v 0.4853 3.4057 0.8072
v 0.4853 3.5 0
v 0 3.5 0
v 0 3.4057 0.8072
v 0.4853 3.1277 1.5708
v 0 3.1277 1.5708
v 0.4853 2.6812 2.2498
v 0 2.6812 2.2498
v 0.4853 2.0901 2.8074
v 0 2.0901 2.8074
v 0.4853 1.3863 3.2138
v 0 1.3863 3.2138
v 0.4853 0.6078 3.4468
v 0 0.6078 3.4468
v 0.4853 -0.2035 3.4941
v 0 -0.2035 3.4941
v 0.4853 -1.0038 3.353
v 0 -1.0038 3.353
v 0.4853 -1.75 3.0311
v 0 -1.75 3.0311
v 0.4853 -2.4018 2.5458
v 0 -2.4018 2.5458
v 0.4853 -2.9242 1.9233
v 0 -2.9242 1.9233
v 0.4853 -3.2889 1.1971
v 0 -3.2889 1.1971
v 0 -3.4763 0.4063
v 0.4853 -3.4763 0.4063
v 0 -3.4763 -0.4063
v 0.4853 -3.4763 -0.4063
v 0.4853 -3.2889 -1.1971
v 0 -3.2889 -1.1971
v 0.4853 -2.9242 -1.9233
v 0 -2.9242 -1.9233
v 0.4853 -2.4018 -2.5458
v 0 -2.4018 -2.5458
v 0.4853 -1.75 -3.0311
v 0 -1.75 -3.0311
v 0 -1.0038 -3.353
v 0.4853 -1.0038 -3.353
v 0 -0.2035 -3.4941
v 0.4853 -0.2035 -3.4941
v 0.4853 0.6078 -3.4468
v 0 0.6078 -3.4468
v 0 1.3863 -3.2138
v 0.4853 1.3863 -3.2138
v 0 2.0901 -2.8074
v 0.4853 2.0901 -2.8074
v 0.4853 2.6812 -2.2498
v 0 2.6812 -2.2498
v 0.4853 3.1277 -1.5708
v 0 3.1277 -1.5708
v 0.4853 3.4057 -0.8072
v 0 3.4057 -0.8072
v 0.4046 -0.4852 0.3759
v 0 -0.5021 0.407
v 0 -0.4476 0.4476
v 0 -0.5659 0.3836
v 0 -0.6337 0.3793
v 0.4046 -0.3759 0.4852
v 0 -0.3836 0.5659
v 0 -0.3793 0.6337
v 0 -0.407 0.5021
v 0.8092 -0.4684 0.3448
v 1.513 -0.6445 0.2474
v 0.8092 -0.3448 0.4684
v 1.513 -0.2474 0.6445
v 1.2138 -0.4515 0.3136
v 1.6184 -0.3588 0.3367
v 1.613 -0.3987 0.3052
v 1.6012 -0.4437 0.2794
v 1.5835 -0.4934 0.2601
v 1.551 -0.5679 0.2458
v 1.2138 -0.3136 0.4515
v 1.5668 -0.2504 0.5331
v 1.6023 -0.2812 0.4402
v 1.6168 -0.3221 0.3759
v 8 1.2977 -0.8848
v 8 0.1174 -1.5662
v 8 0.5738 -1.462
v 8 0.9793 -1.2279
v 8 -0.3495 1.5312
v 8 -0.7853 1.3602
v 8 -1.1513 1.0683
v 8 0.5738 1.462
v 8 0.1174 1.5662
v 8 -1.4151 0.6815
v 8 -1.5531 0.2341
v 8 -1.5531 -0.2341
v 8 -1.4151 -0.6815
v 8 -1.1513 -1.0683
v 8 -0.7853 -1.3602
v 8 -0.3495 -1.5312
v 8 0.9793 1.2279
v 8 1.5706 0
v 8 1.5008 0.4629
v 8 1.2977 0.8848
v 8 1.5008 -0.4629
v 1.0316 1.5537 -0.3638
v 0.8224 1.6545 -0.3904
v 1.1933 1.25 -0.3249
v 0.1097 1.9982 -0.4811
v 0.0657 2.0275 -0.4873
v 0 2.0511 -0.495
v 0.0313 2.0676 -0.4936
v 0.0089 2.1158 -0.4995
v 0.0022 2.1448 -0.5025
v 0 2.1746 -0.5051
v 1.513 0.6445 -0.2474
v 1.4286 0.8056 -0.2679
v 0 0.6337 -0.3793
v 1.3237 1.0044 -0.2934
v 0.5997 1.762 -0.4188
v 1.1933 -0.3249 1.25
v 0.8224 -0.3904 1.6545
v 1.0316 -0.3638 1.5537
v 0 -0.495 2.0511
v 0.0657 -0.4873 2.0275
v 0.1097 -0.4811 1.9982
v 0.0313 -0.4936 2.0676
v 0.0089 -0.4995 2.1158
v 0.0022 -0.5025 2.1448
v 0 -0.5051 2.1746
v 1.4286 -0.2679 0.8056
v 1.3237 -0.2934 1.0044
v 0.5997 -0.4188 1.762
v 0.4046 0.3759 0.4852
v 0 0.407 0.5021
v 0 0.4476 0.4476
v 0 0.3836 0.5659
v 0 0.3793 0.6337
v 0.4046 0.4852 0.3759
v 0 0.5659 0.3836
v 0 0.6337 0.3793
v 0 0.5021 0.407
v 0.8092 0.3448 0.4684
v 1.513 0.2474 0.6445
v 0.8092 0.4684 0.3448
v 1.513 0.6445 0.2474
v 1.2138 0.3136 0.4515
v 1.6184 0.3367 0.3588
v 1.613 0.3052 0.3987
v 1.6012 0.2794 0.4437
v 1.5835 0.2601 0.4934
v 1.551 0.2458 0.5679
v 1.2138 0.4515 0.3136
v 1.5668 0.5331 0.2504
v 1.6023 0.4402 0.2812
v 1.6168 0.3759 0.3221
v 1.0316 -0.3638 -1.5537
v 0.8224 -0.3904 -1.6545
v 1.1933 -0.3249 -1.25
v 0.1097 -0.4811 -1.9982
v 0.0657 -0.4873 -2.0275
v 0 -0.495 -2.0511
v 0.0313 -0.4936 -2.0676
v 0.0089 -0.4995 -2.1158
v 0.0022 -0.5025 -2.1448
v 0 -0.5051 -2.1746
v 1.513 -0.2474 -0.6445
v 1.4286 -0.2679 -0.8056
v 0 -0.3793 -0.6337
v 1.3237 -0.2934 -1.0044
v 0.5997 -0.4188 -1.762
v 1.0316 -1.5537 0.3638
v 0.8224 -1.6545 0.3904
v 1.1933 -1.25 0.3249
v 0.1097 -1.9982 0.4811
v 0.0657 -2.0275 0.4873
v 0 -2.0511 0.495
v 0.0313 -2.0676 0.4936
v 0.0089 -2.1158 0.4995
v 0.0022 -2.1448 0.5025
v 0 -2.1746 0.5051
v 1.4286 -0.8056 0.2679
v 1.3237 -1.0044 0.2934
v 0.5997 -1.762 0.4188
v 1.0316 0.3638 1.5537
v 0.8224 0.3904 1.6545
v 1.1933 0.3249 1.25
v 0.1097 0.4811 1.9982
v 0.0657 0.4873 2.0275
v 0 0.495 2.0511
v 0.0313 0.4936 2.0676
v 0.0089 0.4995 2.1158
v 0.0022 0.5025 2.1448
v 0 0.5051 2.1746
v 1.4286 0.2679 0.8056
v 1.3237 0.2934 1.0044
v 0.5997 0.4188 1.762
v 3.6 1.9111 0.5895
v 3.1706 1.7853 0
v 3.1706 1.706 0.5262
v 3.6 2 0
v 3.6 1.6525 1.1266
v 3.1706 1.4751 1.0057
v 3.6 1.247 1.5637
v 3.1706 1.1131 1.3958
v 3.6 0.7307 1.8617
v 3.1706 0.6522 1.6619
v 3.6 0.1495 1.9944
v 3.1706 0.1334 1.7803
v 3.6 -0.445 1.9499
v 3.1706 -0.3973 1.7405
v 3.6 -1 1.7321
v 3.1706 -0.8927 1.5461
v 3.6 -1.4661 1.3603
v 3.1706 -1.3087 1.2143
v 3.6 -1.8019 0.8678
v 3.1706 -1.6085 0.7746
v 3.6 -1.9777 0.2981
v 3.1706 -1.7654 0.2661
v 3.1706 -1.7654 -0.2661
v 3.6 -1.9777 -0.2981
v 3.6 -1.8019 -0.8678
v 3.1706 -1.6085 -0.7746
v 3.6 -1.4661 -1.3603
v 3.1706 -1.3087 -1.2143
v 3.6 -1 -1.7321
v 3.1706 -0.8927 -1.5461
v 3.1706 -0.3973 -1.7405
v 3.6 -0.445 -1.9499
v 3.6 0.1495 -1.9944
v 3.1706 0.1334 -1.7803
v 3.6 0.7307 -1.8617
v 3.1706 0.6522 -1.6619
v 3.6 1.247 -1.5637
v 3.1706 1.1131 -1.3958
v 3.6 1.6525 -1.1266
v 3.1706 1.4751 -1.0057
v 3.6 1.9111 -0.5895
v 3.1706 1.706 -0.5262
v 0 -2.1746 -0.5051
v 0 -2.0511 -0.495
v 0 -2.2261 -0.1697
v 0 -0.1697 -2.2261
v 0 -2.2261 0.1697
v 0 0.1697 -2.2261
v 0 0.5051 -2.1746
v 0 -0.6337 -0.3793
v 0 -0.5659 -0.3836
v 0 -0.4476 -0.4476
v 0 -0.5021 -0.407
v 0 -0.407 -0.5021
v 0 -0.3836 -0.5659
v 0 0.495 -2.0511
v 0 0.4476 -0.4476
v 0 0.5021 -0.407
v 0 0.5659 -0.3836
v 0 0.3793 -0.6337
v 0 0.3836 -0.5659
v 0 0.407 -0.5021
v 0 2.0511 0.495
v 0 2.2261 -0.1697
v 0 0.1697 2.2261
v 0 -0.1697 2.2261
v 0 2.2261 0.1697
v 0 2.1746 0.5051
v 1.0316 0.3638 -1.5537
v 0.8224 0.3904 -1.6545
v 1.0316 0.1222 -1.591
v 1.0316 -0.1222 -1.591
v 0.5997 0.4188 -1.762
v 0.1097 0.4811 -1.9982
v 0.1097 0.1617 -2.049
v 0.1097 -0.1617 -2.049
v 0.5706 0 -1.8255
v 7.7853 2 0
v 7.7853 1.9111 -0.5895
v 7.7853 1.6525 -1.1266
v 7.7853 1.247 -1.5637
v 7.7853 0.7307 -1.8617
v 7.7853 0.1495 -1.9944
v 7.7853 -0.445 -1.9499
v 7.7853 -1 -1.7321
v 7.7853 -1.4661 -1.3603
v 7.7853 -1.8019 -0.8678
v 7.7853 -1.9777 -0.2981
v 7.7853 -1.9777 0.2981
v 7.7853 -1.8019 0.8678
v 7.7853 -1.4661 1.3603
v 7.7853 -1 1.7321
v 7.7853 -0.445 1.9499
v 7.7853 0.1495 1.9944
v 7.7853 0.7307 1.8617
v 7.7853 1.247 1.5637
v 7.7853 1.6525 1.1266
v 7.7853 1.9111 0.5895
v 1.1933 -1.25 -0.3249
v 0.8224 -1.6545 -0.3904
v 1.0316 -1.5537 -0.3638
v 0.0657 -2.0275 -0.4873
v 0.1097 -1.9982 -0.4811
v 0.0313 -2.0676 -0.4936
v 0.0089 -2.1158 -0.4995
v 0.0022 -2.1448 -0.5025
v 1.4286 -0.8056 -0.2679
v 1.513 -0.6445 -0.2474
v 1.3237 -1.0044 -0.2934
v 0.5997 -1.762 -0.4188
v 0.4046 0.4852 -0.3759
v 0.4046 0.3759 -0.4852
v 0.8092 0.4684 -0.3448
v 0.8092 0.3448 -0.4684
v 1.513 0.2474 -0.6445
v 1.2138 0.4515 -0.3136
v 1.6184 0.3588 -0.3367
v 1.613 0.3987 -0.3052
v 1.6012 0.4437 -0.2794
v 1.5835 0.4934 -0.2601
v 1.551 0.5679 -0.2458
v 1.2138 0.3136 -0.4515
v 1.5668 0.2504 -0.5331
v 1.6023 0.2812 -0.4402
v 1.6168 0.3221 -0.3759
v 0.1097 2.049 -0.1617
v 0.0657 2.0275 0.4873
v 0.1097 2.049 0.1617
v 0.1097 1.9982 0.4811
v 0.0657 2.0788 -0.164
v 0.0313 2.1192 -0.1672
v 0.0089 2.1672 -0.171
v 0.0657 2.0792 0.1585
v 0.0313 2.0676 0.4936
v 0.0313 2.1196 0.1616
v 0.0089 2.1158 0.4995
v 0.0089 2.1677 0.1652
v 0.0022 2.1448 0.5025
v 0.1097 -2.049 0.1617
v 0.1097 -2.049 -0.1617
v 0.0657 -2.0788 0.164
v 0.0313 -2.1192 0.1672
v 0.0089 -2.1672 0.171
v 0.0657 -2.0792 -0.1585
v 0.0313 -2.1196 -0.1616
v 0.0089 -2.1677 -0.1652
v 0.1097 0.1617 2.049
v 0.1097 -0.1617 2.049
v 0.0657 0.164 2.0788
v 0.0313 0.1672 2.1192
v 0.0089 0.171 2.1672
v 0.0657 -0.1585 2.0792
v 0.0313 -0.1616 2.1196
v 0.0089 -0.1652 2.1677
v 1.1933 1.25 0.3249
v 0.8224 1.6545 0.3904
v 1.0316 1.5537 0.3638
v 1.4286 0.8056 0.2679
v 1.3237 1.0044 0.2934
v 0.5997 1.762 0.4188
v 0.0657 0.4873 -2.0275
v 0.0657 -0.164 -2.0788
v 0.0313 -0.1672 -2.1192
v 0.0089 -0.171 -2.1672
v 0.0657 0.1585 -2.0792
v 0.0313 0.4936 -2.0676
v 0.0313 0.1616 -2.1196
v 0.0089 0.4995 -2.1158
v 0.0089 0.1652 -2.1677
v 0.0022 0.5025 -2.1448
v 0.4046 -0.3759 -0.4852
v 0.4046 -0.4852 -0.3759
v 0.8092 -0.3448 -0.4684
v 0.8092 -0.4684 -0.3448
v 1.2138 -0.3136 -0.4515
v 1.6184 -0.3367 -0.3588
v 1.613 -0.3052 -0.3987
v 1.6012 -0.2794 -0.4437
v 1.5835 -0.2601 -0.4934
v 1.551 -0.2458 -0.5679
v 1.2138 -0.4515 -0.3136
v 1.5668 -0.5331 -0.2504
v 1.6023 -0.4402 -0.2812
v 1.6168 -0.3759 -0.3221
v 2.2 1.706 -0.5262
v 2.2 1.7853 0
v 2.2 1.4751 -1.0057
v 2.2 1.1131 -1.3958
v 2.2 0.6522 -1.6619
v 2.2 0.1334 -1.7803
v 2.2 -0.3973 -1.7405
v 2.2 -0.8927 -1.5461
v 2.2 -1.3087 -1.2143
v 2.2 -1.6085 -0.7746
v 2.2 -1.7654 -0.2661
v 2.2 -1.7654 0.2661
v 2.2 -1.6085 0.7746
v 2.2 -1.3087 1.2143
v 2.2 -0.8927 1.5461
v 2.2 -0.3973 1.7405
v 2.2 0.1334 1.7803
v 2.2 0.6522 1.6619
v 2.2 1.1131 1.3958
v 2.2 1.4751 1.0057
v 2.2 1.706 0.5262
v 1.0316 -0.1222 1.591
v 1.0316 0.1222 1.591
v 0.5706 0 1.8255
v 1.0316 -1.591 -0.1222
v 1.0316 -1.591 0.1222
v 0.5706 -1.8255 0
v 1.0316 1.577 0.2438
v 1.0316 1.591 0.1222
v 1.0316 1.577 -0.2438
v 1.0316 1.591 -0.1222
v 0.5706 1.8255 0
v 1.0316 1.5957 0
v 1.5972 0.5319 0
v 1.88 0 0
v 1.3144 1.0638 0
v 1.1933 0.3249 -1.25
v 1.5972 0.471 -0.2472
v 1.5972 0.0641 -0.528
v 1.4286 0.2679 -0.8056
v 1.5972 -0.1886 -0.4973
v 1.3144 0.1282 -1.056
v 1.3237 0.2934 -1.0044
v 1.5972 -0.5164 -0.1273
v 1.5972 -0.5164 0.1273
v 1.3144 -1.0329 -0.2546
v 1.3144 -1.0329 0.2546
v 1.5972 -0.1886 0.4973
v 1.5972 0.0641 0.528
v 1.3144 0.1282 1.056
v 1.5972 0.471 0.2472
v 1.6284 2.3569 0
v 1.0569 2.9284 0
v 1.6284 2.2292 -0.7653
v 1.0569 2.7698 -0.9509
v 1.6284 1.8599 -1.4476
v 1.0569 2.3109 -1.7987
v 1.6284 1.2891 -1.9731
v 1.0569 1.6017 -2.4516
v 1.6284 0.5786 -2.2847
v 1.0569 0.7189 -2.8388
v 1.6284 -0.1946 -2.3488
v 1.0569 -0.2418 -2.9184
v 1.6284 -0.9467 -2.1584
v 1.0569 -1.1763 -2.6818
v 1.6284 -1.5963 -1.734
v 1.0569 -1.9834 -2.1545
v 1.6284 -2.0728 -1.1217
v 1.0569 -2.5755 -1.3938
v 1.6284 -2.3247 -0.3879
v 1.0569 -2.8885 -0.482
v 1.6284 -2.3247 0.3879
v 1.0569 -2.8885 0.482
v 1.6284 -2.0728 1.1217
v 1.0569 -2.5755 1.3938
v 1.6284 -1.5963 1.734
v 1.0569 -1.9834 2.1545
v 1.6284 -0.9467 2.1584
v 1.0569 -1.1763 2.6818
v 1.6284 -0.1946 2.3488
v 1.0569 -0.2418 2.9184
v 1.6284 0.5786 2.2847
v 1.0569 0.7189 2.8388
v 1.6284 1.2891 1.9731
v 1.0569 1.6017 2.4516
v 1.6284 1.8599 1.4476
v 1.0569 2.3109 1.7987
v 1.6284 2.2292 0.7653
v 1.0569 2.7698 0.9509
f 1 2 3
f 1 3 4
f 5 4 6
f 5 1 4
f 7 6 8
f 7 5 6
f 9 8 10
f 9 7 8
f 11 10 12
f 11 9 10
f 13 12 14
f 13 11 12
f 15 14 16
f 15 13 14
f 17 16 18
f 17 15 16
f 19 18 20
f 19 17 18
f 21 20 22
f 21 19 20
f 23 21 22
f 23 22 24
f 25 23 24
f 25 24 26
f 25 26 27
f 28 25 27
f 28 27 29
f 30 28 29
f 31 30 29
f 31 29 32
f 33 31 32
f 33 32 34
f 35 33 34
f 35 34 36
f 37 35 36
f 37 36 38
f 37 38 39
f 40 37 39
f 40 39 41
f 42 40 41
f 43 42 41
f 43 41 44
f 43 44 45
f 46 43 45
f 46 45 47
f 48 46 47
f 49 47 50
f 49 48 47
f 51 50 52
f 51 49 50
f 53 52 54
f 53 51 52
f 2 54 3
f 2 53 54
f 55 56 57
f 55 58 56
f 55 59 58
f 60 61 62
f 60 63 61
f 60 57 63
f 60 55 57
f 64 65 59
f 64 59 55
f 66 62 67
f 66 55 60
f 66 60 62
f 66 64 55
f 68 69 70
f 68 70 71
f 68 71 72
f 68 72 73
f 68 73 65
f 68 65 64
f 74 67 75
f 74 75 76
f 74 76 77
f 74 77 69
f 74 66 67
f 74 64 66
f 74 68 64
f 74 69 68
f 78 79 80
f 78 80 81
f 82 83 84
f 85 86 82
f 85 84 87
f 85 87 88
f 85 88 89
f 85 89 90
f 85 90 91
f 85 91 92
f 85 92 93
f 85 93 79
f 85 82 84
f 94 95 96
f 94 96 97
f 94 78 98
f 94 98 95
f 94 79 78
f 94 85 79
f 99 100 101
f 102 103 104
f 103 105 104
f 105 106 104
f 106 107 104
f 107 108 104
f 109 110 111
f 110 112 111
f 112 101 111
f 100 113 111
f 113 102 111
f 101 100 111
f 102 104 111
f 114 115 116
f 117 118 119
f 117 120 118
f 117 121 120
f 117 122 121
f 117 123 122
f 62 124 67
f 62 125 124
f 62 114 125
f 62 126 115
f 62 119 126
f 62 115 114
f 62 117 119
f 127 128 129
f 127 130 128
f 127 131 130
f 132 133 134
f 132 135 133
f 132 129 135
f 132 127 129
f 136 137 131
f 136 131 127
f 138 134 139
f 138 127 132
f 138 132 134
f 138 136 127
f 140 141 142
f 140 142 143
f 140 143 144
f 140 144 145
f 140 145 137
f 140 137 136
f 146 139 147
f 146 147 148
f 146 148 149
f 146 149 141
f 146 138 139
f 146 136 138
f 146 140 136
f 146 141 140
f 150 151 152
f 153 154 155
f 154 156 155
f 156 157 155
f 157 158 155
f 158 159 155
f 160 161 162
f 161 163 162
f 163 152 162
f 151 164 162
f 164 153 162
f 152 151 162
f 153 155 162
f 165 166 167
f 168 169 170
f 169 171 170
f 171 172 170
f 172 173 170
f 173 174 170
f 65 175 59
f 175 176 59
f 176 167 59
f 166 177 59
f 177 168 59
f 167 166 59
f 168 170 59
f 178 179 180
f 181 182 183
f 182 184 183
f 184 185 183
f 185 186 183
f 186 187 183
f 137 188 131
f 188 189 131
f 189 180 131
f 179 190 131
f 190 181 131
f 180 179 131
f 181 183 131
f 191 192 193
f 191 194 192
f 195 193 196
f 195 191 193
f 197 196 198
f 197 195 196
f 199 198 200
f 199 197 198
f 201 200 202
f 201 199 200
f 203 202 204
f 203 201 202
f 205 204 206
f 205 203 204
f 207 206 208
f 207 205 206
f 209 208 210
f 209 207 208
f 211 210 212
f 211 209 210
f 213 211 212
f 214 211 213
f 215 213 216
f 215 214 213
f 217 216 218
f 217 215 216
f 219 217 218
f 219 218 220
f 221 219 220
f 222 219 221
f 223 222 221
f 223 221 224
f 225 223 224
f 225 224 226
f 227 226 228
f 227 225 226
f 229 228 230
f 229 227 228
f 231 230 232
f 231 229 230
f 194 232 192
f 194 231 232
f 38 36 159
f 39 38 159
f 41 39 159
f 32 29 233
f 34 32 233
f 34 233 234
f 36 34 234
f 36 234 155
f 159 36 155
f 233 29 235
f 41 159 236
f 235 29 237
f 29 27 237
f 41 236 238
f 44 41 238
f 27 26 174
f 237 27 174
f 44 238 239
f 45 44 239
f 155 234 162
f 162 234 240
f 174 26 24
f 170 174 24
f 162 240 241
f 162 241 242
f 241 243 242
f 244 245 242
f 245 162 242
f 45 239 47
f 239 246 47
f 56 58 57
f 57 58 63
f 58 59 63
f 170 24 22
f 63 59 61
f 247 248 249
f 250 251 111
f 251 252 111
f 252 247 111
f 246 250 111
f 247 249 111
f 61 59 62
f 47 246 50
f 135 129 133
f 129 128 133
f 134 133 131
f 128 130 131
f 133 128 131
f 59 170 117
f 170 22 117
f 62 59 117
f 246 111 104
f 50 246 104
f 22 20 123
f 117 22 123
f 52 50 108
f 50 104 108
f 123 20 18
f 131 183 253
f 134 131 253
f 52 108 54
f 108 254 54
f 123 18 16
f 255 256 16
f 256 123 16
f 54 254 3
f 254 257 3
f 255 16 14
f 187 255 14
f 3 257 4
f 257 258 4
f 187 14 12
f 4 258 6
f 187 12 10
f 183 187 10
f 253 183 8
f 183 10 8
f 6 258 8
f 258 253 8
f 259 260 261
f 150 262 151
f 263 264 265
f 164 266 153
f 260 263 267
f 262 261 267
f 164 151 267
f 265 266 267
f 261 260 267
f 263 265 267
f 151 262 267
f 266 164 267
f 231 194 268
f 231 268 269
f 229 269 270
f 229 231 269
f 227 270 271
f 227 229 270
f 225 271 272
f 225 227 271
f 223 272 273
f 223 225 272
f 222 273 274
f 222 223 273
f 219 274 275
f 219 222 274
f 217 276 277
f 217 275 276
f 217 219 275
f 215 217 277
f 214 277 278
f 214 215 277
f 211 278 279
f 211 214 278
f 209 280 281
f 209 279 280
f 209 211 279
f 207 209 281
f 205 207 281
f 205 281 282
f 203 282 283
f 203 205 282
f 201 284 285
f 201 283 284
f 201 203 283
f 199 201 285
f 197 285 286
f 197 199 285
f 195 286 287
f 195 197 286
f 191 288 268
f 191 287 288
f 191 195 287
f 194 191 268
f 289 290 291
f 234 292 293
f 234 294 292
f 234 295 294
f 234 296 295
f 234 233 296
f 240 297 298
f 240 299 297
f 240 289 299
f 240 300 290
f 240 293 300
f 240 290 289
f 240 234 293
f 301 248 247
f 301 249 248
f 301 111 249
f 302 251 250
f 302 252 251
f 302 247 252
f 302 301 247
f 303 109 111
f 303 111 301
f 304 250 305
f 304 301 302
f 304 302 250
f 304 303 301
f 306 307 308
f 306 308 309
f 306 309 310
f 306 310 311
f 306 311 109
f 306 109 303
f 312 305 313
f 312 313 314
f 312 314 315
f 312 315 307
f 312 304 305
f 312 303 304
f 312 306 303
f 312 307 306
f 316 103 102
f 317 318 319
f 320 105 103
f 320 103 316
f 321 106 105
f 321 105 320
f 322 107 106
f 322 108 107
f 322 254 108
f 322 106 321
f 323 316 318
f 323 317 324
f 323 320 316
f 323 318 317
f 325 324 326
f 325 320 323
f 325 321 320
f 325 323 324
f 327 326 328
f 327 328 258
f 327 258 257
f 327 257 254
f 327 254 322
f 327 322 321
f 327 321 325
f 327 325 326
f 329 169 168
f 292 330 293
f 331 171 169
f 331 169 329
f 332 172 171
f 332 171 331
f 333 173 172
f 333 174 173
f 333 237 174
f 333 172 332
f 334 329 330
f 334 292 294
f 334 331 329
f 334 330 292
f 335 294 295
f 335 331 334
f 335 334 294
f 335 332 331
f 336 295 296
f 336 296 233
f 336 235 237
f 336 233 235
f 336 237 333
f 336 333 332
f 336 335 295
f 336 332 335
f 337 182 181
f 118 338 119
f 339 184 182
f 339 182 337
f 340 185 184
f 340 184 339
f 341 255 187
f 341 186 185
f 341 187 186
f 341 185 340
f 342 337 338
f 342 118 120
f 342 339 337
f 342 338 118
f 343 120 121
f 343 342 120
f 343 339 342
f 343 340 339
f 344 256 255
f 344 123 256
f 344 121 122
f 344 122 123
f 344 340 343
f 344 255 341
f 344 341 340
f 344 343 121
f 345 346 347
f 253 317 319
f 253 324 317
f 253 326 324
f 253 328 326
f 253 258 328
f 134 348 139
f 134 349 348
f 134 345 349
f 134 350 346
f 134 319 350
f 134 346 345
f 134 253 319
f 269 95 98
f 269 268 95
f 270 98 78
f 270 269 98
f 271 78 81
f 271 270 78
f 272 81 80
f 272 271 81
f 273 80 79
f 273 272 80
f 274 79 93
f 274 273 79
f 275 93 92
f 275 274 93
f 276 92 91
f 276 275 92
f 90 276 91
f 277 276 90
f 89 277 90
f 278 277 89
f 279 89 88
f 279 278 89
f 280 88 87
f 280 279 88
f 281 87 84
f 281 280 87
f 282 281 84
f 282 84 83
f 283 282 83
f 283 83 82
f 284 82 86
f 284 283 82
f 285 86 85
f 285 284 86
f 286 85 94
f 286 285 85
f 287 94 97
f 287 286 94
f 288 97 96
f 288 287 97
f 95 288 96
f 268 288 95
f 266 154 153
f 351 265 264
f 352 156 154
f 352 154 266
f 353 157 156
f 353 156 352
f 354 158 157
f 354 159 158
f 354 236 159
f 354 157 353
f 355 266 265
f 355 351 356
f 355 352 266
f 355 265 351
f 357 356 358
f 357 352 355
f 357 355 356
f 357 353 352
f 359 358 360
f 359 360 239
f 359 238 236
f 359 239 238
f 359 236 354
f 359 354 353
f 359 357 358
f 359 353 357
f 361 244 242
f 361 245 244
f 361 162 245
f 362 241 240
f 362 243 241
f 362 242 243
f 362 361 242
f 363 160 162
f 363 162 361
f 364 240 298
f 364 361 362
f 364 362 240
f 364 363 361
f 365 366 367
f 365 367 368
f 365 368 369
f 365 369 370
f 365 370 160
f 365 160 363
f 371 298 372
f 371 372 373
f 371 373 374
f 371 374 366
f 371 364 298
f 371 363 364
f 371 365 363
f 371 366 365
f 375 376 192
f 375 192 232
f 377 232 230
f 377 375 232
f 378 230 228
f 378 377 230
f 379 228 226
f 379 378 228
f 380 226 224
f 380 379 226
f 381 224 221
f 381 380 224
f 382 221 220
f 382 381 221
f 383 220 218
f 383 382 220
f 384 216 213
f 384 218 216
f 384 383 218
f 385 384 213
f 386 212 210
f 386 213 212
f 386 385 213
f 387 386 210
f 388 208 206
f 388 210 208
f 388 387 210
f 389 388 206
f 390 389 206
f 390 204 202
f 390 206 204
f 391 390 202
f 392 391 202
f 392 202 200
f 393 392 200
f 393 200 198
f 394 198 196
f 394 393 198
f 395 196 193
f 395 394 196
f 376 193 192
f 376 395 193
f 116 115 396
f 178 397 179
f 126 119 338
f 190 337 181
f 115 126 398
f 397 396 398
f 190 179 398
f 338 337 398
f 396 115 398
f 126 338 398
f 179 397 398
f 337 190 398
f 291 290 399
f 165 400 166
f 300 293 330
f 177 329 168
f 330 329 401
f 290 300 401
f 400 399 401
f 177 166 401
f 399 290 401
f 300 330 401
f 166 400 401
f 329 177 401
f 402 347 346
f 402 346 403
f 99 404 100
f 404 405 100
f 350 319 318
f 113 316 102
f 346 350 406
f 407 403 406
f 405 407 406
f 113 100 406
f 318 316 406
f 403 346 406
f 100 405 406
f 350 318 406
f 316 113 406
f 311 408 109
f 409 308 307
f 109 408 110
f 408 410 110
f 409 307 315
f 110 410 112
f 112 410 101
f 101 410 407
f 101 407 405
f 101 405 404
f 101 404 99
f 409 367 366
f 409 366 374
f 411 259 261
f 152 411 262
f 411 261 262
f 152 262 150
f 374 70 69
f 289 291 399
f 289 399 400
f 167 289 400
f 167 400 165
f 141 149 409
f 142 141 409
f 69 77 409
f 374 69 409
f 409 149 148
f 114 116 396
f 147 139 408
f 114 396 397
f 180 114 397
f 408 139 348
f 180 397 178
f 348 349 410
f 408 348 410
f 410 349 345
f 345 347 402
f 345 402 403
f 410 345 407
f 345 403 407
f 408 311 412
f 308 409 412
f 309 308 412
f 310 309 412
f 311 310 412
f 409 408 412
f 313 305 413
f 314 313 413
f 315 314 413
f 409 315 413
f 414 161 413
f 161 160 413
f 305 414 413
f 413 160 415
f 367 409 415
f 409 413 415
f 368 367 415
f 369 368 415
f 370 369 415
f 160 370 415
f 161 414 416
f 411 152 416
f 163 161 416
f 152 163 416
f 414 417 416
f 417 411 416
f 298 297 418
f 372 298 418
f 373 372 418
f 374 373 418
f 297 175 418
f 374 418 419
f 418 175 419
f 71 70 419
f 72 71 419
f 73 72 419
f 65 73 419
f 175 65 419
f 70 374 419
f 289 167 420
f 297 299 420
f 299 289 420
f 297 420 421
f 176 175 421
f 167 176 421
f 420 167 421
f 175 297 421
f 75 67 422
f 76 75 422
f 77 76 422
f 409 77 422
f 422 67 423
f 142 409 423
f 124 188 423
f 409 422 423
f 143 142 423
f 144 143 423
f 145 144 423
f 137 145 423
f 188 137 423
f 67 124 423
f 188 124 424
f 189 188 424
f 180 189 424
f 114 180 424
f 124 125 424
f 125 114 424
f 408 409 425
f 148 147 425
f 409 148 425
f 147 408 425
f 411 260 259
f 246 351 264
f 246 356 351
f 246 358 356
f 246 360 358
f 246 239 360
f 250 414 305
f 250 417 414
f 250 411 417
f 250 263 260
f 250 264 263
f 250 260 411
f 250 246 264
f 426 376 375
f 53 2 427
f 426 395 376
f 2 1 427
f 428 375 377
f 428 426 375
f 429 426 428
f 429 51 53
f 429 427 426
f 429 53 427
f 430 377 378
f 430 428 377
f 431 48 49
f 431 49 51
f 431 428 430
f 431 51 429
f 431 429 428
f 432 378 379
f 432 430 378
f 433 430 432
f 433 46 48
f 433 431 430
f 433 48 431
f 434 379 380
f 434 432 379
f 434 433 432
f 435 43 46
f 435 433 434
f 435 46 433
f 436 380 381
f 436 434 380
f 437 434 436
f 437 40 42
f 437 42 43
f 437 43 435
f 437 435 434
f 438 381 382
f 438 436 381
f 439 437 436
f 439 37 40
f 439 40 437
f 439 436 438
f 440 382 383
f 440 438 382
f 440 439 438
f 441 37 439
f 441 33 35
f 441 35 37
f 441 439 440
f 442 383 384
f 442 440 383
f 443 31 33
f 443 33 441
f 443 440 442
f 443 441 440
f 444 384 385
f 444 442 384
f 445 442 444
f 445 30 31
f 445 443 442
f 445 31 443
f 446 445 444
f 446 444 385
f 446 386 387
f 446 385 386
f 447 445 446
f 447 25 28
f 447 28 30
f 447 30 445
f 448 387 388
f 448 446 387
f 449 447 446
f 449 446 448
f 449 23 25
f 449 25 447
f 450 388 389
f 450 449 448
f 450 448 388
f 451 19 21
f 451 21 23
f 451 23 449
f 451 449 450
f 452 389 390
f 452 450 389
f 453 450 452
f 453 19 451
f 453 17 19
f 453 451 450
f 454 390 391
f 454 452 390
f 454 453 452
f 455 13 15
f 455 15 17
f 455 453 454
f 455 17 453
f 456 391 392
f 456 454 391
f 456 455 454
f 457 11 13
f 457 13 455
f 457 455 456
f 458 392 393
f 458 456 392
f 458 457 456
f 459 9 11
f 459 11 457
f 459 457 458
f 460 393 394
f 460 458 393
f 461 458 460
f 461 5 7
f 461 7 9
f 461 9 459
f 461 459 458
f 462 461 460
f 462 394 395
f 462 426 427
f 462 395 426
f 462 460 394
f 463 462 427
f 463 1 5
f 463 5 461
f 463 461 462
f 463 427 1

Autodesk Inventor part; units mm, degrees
ref_plane "YZ Plane" through (0, 0, 0) normal (1, 0, 0) x (0, 1, 0)
ref_plane "XZ Plane" through (0, 0, 0) normal (0, 1, 0) x (-1, 0, 0)
sketch "Sketch1" plane through (0, 0, 0) normal (0, 0, 1) x (1, 0, 0)
  line L0 (1.88, 0) -> (8, 0)
  line L1 (8, 0) -> (8, 2)
  line L2 (8, 2) -> (3.6, 2)
  line L3 (3.6, 2) -> (3.1706, 1.7853)
  line L4 (3.1706, 1.7853) -> (2.2, 1.7853)
  line L5 (0, 3.5) -> (0, 2.11)
  line L6 (0, 2.11) -> (1.0316, 1.5957)
  line L7 (1.0316, 1.5957) -> (1.88, 0)
  line L8 (-1.6, 0) -> (9.6, 0) projected
  line L9 (0, -0.7) -> (0, 4.2) projected
  line L10 (0, 3.5) -> (0.4853, 3.5)
  line L11 (0.4853, 3.5) -> (2.2, 1.7853)
  line L12 (3.6, 2) -> (1.9853, 2) construction
  dimension "d1" = 4.4
  dimension "d2" = 4
  dimension "d3" = 3.5706
  dimension "d4" = 4.22
  dimension "d5" = 26.5
  dimension "d6" = 62
  dimension "d7" = 1.88
  dimension "d8" = 0.4294
  dimension "d12" = 7
  dimension "d13" = 45
  dimension "d15" = 8
  dimension "d24" = 2.2
revolve "Body" add sketch "Sketch1" angle 360 about axis through (1.88, 0, 0) along (1, 0, 0) contours L7 L6 L5 L10 L11 L4 L3 L2 L1 L0
sketch "Sketch2" plane through (0, 0, 0) normal (-1, 0, 0) x (0, 0, 1)
  line L0 (0, 2.11) -> (0, 0) construction
  line L1 (0, 0) -> (2.11, 0) construction
  arc A0 (0.633, 0) -> (0, 0.633) centre (0, 0) ccw construction
  arc A1 (0.7385, 0) -> (0, 0.7385) centre (0, 0) ccw construction
  arc A2 (2.0511, 0.495) -> (0.495, 2.0511) centre (0, 0) ccw
  line L2 (0, 0) -> (1.492, 1.492) construction
  line L3 (0.495, 2.0511) -> (0.3793, 0.6337)
  line L4 (2.0511, 0.495) -> (0.6337, 0.3793)
  arc A3 (0.495, 2.0511) -> (0, 2.11) centre (0, 0) ccw
  arc A4 (2.11, 0) -> (2.0511, 0.495) centre (0, 0) ccw
  line L5 (0, -4.9) -> (0, 4.9) projected
  line L6 (-4.9, 0) -> (4.9, 0) projected
  arc A5 (0.495, -2.0511) -> (2.0511, -0.495) centre (0, 0) ccw
  line L7 (0.495, -2.0511) -> (0.3793, -0.6337)
  line L8 (2.0511, -0.495) -> (0.6337, -0.3793)
  arc A6 (0, -2.11) -> (0.495, -2.0511) centre (0, 0) ccw
  arc A7 (2.0511, -0.495) -> (2.11, 0) centre (0, 0) ccw
  arc A8 (-0.495, 2.0511) -> (-2.0511, 0.495) centre (0, 0) ccw
  line L9 (-0.495, 2.0511) -> (-0.3793, 0.6337)
  line L10 (-2.0511, 0.495) -> (-0.6337, 0.3793)
  arc A9 (0, 2.11) -> (-0.495, 2.0511) centre (0, 0) ccw
  arc A10 (-2.0511, 0.495) -> (-2.11, 0) centre (0, 0) ccw
  arc A11 (-0.495, -2.0511) -> (0, -2.11) centre (0, 0) ccw
  arc A12 (-2.0511, -0.495) -> (-0.495, -2.0511) centre (0, 0) ccw
  arc A13 (-2.11, 0) -> (-2.0511, -0.495) centre (0, 0) ccw
  line L11 (-2.0511, -0.495) -> (-0.6337, -0.3793)
  line L12 (-0.495, -2.0511) -> (-0.3793, -0.6337)
  arc A14 (0.3793, 0.6337) -> (0.6337, 0.3793) centre (0.6145, 0.6145) ccw
  arc A15 (0.6337, -0.3793) -> (0.3793, -0.6337) centre (0.6145, -0.6145) ccw
  arc A16 (-0.6337, 0.3793) -> (-0.3793, 0.6337) centre (-0.6145, 0.6145) ccw
  arc A17 (-0.3793, -0.6337) -> (-0.6337, -0.3793) centre (-0.6145, -0.6145) ccw
  point P0 (1.492, -1.492)
  point P1 (-1.492, 1.492)
  point P2 (-1.492, -1.492)
  dimension "d17" = 1.266
  dimension "d18" = 1.477
  dimension "d19" = 4.22
  dimension "d20" = 45
  dimension "d21" = 0.495
extrude "Slot" add sketch "Sketch2" against normal up to next draft 5 contours L4 A14 L3 A2 | A5 L7 A15 L8 | L9 A16 L10 A8 | A12 L11 A17 L12
fillet "Fillet1" radius 0.198 4 edges at (0, 2.11, 0) (0, 0, -2.11) (0, -2.11, 0) (0, 0, 2.11)
thread "Thread" size "M4x0.7" class "6g" standard "ISO Metric profile" length 4.4
chamfer "Chamfer1" distance 0.4294 distance2 0.2147 1 edges at (8, -2, 0) measured on face at (8, -0.499, 0.4421)
ref_plane "Work Plane2" through (3.35, 0, 0) normal (0, 0, -1) x (1, 0, 0)
equation "\"d17\" = 0.3 * SDM"
equation "\"d18\" = 0.35 * SDM"
equation "\"d19\" = SDM"
equation "\"d21\" = 0.5 * SBR"
equation "\"d1\" = GEL"
equation "\"d2\" = GD"
equation "\"d3\" = BDM"
equation "\"d4\" = SDM"
equation "\"d7\" = INTI"
equation "\"d8\" = GAL"
equation "\"d12\" = KOD"
equation "\"d13\" = 0.5 * SEWI"
equation "\"d15\" = NLG"
equation "\"d24\" = KOH"
equation "\"d23\" = 0.2 * SBR"
equation "\"d10\" = GEL"
equation "\"d25\" = -0.5 * SPD + 0.5 * GD"
equation "\"d26\" = 0.5 * GAL"
equation "\"NLG\" = 8"
equation "\"GEL\" = 4.4"
equation "\"GAL\" = 0.61345 * PTC"
equation "\"SPD\" = NND - 1.2269 * PTC"
equation "\"KOD\" = 7"
equation "\"KOH\" = 2.2"
equation "\"SBR\" = 0.99"
equation "\"INTI\" = 1.88"
equation "\"SDM\" = 4.22"
equation "\"GD\" = NND"
equation "\"BDM\" = NND - GAL"
equation "\"SEWI\" = 90deg"
equation "\"d9\" = SDM"
equation "\"GUL\" = 0.61345 * PTC"
equation "\"TOA\" = 30deg"
equation "\"EPV\" = 4.2"
equation "\"THREADDIA\" = 4"
equation "\"RR\" = 0.4"
equation "\"PTC\" = 0.7"
equation "\"NND\" = 4"
equation "\"GD1\" = THREADDIA - 1.2269 * PTC"
properties part number "AS 1427 - M4 x 8" material "Steel, Mild"
